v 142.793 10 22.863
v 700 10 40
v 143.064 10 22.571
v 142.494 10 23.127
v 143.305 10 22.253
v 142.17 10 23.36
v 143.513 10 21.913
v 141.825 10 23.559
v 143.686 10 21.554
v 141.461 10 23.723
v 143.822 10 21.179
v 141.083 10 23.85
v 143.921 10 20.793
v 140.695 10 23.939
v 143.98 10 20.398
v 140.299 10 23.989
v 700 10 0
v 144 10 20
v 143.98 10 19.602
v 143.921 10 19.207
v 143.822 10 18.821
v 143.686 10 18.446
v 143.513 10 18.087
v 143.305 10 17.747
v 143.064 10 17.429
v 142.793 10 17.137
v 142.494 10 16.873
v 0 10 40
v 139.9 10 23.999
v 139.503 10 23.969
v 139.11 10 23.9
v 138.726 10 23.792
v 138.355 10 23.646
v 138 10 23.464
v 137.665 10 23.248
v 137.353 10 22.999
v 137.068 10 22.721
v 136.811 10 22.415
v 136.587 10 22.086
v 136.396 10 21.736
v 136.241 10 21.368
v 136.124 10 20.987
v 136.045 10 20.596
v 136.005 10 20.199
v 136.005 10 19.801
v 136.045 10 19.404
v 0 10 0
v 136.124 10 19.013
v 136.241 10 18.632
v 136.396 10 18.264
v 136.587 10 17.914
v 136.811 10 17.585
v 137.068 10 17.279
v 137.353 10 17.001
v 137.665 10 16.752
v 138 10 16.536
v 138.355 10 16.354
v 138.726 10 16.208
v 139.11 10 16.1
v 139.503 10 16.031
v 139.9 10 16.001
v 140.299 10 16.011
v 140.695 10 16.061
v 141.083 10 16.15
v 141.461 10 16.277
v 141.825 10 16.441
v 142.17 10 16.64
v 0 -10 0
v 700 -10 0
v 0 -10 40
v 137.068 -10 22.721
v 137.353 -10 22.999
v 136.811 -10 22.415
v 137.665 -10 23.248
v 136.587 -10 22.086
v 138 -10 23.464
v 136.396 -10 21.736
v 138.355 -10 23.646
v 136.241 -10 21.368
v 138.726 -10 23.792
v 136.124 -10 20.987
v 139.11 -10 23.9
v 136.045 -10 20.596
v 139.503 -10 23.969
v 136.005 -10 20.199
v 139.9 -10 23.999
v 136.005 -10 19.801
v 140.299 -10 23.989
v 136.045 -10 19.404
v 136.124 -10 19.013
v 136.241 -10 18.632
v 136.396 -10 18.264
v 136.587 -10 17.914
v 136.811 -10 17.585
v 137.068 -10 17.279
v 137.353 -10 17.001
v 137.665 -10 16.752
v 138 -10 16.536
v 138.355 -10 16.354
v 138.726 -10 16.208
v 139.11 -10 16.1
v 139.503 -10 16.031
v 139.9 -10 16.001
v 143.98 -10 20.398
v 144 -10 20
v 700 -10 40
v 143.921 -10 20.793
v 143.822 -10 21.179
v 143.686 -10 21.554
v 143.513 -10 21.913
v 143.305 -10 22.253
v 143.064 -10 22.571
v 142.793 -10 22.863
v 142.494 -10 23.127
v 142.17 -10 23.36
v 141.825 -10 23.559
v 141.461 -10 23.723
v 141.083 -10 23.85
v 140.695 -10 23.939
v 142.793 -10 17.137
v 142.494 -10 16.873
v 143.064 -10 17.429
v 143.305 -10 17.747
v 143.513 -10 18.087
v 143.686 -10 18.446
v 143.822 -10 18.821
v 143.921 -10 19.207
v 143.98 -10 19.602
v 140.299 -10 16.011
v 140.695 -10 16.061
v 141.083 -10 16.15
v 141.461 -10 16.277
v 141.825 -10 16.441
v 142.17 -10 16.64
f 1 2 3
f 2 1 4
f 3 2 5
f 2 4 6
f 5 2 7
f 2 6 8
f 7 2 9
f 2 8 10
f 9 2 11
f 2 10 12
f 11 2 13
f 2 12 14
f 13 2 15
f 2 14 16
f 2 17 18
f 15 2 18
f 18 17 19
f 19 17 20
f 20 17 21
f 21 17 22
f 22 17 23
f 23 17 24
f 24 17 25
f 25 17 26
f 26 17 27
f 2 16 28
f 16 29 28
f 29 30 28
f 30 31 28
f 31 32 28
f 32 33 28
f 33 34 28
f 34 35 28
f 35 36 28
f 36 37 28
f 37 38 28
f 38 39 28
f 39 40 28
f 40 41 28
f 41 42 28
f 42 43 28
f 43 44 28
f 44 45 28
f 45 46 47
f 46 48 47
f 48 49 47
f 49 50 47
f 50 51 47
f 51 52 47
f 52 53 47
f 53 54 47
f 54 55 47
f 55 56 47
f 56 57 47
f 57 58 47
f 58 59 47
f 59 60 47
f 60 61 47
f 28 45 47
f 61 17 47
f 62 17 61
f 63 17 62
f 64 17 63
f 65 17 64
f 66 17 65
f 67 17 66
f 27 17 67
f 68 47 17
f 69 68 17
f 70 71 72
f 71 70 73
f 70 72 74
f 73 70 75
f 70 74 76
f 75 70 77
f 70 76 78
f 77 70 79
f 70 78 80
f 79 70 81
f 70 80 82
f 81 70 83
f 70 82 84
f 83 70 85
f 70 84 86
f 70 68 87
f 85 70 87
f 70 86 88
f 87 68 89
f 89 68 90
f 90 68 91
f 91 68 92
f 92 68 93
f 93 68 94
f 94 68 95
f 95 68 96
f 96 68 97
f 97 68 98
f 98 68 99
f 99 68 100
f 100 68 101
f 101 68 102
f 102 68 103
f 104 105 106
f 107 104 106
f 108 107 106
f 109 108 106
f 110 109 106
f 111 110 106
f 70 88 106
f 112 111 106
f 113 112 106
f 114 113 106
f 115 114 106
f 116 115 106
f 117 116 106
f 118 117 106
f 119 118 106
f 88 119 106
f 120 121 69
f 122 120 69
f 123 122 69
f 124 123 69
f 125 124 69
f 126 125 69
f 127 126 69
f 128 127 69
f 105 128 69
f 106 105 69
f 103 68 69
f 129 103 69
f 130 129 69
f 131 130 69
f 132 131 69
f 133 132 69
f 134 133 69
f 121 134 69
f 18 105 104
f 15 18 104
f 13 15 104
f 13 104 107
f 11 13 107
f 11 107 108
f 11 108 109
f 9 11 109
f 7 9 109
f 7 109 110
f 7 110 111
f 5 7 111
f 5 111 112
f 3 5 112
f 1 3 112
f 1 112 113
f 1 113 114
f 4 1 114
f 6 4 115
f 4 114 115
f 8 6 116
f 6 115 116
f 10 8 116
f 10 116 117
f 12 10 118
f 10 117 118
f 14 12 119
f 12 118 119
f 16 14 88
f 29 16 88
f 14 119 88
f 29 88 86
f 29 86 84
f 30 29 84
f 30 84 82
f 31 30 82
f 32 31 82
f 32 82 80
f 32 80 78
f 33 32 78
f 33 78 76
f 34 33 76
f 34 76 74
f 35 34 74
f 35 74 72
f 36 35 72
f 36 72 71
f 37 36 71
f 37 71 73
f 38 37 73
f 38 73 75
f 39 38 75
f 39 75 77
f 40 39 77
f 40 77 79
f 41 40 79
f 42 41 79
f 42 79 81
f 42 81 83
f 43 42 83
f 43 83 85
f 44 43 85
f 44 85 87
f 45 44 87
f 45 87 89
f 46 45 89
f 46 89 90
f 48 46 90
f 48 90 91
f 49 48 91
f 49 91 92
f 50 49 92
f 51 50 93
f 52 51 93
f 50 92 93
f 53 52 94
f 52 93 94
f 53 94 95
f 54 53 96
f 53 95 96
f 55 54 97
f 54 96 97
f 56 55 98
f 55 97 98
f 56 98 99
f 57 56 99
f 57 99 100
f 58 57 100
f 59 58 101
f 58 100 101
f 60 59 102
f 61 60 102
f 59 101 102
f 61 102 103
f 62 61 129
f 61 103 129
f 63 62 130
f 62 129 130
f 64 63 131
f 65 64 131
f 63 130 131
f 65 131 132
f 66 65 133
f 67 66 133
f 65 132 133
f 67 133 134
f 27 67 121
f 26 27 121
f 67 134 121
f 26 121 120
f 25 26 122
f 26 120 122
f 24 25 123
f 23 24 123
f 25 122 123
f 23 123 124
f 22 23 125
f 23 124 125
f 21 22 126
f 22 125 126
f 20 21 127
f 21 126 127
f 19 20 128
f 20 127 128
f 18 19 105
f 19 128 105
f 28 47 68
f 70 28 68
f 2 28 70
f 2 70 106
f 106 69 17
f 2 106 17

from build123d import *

# Parameters (mm, degrees)
F1_DEPTH = 40
F2_R     = 4
F3_DEPTH = 25


with BuildPart() as f1:
    # F0 (on Top) → F1 (new body)
    with BuildSketch(Plane.XY):
        Polygon((700, -10), (700, 10), (0.3576, 10), (0, 10), (0, -10), align=None)
    extrude(amount=F1_DEPTH)

    # F2 (on face) → F3 (cut)
    with BuildSketch(Plane.XZ.offset(10)):
        with Locations((140, 20)):
            Circle(F2_R)
    extrude(amount=-F3_DEPTH, mode=Mode.SUBTRACT)


solid = f1.part
